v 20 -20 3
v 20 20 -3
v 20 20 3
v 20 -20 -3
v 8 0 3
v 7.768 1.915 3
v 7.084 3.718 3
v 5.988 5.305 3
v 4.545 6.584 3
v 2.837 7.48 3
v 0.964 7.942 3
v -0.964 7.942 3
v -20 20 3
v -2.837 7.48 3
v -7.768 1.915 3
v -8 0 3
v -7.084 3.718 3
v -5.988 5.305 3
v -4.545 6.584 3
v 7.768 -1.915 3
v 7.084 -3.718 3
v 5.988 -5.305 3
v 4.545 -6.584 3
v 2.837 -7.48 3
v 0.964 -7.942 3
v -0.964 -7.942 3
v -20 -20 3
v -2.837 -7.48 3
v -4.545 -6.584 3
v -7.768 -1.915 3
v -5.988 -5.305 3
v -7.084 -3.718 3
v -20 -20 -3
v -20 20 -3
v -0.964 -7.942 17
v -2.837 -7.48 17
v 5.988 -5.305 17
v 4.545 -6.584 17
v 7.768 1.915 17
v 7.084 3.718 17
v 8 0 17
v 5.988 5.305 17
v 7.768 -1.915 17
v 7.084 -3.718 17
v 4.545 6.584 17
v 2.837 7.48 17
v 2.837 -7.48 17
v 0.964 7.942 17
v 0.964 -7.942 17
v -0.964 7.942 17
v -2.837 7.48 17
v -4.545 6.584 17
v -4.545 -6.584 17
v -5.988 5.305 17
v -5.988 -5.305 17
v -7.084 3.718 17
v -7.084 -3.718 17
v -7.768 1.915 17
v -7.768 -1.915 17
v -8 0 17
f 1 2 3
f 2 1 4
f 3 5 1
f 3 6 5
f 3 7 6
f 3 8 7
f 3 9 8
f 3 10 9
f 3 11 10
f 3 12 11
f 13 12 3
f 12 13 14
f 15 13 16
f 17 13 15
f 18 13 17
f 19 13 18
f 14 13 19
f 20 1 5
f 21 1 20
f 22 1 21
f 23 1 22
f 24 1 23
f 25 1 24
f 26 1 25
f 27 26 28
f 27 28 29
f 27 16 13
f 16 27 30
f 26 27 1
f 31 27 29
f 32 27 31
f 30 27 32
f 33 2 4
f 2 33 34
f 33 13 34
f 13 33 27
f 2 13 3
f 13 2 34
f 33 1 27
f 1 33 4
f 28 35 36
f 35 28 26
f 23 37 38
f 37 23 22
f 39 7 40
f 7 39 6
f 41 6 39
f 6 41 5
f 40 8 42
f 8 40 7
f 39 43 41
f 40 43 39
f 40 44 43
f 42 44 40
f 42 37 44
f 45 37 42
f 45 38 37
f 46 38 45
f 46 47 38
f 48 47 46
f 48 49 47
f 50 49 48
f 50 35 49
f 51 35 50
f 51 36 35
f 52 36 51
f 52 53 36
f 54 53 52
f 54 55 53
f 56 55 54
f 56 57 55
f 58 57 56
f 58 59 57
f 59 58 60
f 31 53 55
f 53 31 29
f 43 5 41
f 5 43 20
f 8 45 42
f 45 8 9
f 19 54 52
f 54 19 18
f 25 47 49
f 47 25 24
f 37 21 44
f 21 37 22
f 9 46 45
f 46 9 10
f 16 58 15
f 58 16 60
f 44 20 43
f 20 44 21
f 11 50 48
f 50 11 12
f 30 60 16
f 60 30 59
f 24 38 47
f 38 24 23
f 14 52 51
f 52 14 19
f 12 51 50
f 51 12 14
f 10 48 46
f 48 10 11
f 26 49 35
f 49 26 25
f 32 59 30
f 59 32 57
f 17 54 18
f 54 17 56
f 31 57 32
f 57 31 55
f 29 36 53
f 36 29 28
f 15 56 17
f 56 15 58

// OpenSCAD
FNSET = 0; $fn = FNSET;
union() { cube([40, 40, 6], center = true); translate([0, 0, 3]) cylinder(d = 16, h = 14); }
